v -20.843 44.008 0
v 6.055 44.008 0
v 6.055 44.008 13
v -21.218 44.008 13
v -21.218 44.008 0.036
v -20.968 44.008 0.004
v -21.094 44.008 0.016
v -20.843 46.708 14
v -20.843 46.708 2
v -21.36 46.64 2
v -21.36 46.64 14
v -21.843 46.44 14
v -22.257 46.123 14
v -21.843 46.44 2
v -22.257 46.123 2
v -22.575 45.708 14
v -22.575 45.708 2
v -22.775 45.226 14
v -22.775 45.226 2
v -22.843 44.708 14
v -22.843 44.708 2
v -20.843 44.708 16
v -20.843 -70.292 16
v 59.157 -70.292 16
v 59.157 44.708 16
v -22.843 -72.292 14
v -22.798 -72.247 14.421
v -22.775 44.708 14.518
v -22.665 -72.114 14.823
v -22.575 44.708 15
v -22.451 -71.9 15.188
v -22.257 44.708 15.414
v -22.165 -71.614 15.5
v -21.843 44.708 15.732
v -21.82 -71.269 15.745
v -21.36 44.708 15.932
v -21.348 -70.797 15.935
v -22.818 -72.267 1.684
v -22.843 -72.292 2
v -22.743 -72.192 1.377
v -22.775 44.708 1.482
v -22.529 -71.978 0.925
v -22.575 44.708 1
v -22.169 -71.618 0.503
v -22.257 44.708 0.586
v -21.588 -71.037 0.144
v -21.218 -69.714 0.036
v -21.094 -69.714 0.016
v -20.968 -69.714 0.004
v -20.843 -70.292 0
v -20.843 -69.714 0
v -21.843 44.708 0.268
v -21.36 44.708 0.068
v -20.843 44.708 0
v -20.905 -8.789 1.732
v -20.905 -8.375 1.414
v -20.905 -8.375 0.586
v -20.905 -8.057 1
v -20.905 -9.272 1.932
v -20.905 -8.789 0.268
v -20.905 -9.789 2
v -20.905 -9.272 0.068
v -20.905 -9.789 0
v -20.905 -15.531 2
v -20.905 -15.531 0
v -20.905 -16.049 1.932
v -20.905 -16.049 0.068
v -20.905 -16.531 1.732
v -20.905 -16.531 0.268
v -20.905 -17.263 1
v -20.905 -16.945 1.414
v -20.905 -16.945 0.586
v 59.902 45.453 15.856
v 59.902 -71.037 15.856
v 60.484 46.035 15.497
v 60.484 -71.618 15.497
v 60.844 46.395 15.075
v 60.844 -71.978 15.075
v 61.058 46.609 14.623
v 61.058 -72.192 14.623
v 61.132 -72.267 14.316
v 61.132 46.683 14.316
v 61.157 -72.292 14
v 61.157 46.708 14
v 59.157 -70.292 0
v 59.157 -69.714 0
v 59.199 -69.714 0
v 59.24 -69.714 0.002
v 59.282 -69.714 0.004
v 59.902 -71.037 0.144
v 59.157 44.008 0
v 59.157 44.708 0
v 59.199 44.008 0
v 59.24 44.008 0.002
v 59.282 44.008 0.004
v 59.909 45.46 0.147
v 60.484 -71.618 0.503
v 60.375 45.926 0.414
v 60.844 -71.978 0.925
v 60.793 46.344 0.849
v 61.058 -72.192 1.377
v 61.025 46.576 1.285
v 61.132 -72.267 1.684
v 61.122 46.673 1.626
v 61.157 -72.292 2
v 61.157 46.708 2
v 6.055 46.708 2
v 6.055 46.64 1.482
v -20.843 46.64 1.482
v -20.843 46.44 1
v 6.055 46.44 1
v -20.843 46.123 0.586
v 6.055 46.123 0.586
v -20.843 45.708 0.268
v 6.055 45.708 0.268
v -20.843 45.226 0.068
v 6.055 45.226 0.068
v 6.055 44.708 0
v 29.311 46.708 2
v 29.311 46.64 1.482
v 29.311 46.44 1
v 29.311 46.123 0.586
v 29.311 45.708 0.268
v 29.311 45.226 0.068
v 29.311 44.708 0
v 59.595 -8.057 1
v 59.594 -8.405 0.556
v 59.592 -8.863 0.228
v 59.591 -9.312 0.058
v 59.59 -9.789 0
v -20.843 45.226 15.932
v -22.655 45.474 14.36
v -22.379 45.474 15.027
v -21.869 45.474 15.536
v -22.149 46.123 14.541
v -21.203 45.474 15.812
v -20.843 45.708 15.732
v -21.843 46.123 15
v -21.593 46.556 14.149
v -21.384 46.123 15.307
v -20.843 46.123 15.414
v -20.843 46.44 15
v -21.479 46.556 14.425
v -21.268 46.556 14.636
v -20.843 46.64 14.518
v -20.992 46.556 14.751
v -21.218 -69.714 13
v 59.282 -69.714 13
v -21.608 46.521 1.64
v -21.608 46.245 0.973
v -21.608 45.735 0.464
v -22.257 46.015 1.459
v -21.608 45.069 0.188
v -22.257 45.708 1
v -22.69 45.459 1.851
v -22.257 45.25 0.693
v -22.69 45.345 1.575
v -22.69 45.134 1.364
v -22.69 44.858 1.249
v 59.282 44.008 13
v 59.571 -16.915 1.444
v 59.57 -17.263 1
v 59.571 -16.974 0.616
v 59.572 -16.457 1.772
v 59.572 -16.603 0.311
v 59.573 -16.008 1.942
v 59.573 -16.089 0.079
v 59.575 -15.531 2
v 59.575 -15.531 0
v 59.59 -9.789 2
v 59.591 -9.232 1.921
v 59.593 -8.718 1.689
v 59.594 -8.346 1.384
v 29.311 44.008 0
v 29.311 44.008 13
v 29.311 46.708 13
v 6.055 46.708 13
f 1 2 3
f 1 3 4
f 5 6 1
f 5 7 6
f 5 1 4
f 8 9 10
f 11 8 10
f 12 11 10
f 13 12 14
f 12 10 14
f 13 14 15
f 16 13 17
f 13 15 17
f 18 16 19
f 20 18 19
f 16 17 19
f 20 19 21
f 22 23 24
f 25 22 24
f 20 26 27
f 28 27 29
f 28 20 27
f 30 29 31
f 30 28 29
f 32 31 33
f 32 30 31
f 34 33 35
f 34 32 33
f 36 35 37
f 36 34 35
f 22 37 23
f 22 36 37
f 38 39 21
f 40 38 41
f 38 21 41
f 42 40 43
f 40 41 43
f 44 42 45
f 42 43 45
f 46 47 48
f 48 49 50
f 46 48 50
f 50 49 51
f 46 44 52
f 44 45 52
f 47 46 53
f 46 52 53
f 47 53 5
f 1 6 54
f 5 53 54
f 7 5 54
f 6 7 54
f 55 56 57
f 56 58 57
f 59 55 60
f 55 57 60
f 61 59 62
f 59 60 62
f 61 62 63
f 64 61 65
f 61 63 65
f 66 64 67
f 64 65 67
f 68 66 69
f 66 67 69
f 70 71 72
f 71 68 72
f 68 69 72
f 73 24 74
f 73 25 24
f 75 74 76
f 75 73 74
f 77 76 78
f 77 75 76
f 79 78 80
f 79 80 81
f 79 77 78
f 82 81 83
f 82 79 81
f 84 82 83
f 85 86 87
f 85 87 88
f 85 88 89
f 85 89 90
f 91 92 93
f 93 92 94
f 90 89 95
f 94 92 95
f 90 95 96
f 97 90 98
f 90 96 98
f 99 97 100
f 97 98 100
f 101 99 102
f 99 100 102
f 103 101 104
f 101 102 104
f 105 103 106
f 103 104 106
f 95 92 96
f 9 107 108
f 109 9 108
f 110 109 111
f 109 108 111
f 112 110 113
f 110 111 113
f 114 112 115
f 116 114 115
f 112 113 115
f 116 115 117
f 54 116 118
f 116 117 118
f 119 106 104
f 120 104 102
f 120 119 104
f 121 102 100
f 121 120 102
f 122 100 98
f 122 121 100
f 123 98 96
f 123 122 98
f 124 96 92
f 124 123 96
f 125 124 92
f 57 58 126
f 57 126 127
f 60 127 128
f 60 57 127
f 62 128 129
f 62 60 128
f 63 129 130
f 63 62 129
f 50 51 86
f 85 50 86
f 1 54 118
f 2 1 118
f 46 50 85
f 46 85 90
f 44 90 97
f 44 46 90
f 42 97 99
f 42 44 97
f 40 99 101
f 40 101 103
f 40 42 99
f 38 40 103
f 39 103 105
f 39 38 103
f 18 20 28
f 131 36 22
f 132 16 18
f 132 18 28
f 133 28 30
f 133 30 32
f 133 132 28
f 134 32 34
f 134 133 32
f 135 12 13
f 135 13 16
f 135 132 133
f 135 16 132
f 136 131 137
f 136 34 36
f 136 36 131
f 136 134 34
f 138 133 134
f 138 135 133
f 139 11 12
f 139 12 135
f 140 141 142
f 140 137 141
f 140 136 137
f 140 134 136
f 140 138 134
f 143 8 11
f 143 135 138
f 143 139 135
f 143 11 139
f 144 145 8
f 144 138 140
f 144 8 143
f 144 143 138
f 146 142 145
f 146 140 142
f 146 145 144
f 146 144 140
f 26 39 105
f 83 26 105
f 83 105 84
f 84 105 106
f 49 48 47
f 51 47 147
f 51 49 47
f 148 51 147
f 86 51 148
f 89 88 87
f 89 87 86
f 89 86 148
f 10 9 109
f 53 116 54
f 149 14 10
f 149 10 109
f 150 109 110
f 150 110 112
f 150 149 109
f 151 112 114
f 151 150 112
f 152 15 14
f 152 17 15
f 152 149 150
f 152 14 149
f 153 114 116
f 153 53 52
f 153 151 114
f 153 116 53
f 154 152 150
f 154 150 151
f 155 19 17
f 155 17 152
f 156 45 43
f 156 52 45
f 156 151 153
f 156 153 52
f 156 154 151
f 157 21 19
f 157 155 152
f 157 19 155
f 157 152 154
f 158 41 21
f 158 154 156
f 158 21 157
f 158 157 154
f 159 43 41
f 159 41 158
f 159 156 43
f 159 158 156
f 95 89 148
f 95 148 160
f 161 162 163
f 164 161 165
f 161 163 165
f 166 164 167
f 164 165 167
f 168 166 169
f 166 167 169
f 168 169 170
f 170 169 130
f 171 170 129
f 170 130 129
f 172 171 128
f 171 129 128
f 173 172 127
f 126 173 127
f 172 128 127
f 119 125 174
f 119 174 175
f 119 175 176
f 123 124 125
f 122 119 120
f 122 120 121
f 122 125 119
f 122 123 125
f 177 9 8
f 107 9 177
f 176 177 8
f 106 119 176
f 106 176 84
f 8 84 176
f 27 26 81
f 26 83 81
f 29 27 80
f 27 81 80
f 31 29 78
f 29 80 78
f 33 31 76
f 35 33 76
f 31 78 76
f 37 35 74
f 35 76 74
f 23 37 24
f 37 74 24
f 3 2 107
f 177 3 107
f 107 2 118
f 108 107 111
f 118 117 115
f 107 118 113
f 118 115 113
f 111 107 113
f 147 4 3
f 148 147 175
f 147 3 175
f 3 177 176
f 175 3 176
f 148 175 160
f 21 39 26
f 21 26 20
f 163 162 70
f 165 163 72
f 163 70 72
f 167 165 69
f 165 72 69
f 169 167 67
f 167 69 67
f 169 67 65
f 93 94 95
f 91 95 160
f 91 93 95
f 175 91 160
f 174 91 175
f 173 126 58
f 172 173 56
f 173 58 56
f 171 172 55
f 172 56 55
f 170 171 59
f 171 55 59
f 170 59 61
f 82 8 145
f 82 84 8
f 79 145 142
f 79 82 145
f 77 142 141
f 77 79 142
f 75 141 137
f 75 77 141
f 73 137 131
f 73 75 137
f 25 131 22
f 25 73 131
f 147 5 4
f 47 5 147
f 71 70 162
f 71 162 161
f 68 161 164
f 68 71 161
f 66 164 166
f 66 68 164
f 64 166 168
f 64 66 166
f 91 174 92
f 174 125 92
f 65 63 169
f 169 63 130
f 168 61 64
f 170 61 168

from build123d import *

# Parameters (mm, degrees)
F0_W         = 84
F0_H         = 119
F1_DEPTH     = 16
F2_W         = 23.2555542788
F2_H         = 5.3250671498
F3_DEPTH     = 13
F4_R         = 2
F5_T1_DEPTH  = 122
F5_T3_DEPTH  = 94
F5_T5_DEPTH  = 129
F5_T7_DEPTH  = 41.8466055248
F5_T9_DEPTH  = 12
F5_S13_W     = 2
F5_S13_H     = 2
F5_T14_DEPTH = 2
F5_T18_ANGLE = 90
F7_DEPTH     = 2
F8_T1_DEPTH  = 90.4739352316
F8_T3_DEPTH  = 90.5


# Not quite as in the source:
# - a fillet or chamfer that OpenCascade refuses, or shapes differently, is made with other operations: its cross-section is extruded or revolved along the edge and cut away or added


with BuildPart() as f1:
    # F0 (on Top) → F1 (new body)
    with BuildSketch(Plane.XY):
        with Locations((19.1573249176, -12.7916212418)):
            Rectangle(F0_W, F0_H)
    extrude(amount=F1_DEPTH)

    # F2 (on Top) → F3 (cut)
    with BuildSketch(Plane.XY):
        Polygon((6.055165114, 44.0079532564), (-21.2180707604, 44.0079532564), (-21.2180707604, -69.7137644664), (59.2819292396, -69.7137644664), (59.2819292396, 44.0079532564), (29.3107193928, 44.0079532564), align=None)
        with Locations((17.6829422534, 46.6704868313)):
            Rectangle(F2_W, F2_H)
    extrude(amount=F3_DEPTH, mode=Mode.SUBTRACT)

    # F4
    f4_edges = [f1.edges().sort_by_distance(p)[0] for p in [
        (61.157325, -12.791621, 16),
        (19.157325, -72.291621, 16),
        (-22.842675, -12.791621, 16),
        (19.157325, 46.708379, 16),
        (-8.393755, 46.708379, 0),
    ]]
    fillet(f4_edges, radius=F4_R)

    # F5: fillet of radius 2 on 4 edges, made by hand

    # F5_s2 → F5_t1 (cut)
    with BuildSketch(Plane.XZ.offset(-44.7083787582)):
        with BuildLine():
            ThreePointArc((-22.8426750824, 2), (-22.2568886448, 0.5857864376), (-20.8426750824, 0))
            Line((-20.8426750824, 0), (-22.8426750824, 0))
            Line((-22.8426750824, 0), (-22.8426750824, 2))
        make_face()
    extrude(amount=F5_T1_DEPTH, mode=Mode.SUBTRACT)

    # F5_s4 → F5_t3 (cut)
    with BuildSketch(Plane.YZ.offset(-27.8426750824)):
        with BuildLine():
            ThreePointArc((-70.2916212418, 0), (-71.7058348042, 0.5857864376), (-72.2916212418, 2))
            Line((-72.2916212418, 2), (-72.2916212418, 0))
            Line((-72.2916212418, 0), (-70.2916212418, 0))
        make_face()
    extrude(amount=F5_T3_DEPTH, mode=Mode.SUBTRACT)

    # F5_s6 → F5_t5 (cut)
    with BuildSketch(Plane.XZ.offset(-51.7083787582)):
        with BuildLine():
            ThreePointArc((59.1573249176, 0), (60.57153848, 0.5857864376), (61.1573249176, 2))
            Line((61.1573249176, 2), (61.1573249176, 0))
            Line((61.1573249176, 0), (59.1573249176, 0))
        make_face()
    extrude(amount=F5_T5_DEPTH, mode=Mode.SUBTRACT)

    # F5_s8 → F5_t7 (cut)
    with BuildSketch(Plane.YZ.offset(24.3107193928)):
        with BuildLine():
            ThreePointArc((46.7083787582, 2), (46.1225923205, 0.5857864376), (44.7083787582, 0))
            Line((44.7083787582, 0), (46.7083787582, 0))
            Line((46.7083787582, 0), (46.7083787582, 2))
        make_face()
    extrude(amount=F5_T7_DEPTH, mode=Mode.SUBTRACT)

    # F5_s10 → F5_t9 (cut)
    with BuildSketch(Plane.XY.offset(2)):
        with BuildLine():
            ThreePointArc((-20.8426750824, 46.7083787582), (-22.2568886448, 46.1225923205), (-22.8426750824, 44.7083787582))
            Line((-22.8426750824, 44.7083787582), (-22.8426750824, 46.7083787582))
            Line((-22.8426750824, 46.7083787582), (-20.8426750824, 46.7083787582))
        make_face()
    extrude(amount=F5_T9_DEPTH, mode=Mode.SUBTRACT)


with BuildPart() as f5_tool12:
    # F5_s13 → F5_t14 (new body)
    with BuildSketch(Plane.XZ.offset(-44.7083787582)):
        with Locations((-21.8426750824, 15)):
            Rectangle(F5_S13_W, F5_S13_H)
    extrude(amount=-F5_T14_DEPTH)

    # F5_s15 → F5_t16 (revolve, cut)
    with BuildSketch(Plane(origin=(-20.8426750824, 44.7083787582, 14), x_dir=(0.7071067812, 0, -0.7071067812), z_dir=(0.7071067812, 0, 0.7071067812))):
        with BuildLine():
            ThreePointArc((0, -2), (2, 0), (0, 2))
            Line((0, 2), (0, -2))
        make_face()
    revolve(axis=Axis((-20.8426750824, 44.7083787582, 14), (0, 1, 0)), mode=Mode.SUBTRACT)


with BuildPart() as f1_1:
    add(f1.part)

    # F5_t11: cut F5_tool12
    add(f5_tool12.part, mode=Mode.SUBTRACT)

    # F5_s17 → F5_t18 (revolve, cut)
    with BuildSketch(Plane.XY.offset(2)):
        with BuildLine():
            ThreePointArc((-20.8426750824, 46.7083787582), (-22.2568886448, 46.1225923205), (-22.8426750824, 44.7083787582))
            Line((-22.8426750824, 44.7083787582), (-22.8426750824, 46.7083787582))
            Line((-22.8426750824, 46.7083787582), (-20.8426750824, 46.7083787582))
        make_face()
    revolve(axis=Axis((-22.8426750824, 44.7083787582, 2), (-1, 0, 0)), revolution_arc=F5_T18_ANGLE, mode=Mode.SUBTRACT)


with BuildPart() as f7:
    # F6 (on Top) → F7 (new body)
    with BuildSketch(Plane.XY):
        Polygon((59.5953304619, -7.7894940041), (-20.9046695381, -7.7894940041), (-20.9046695381, -17.5308659673), (59.5692656934, -17.5308659673), align=None)
    extrude(amount=F7_DEPTH)

    # F8: fillet of radius 2 on 4 edges, made by hand

    # F8_s2 → F8_t1 (cut)
    with BuildSketch(Plane.YZ.offset(-25.9046695381)):
        with BuildLine():
            ThreePointArc((-17.5308659673, 2), (-16.9450795296, 0.5857864376), (-15.5308659673, 0))
            Line((-15.5308659673, 0), (-17.5308659673, 0))
            Line((-17.5308659673, 0), (-17.5308659673, 2))
        make_face()
        with BuildLine():
            ThreePointArc((-17.5308659673, 0), (-16.9450795296, 1.4142135624), (-15.5308659673, 2))
            Line((-15.5308659673, 2), (-17.5308659673, 2))
            Line((-17.5308659673, 2), (-17.5308659673, 0))
        make_face()
    extrude(amount=F8_T1_DEPTH, mode=Mode.SUBTRACT)

    # F8_s4 → F8_t3 (cut)
    with BuildSketch(Plane.YZ.offset(-25.9046695381)):
        with BuildLine():
            ThreePointArc((-7.7894940041, 2), (-8.3752804417, 0.5857864376), (-9.7894940041, 0))
            Line((-9.7894940041, 0), (-7.7894940041, 0))
            Line((-7.7894940041, 0), (-7.7894940041, 2))
        make_face()
        with BuildLine():
            ThreePointArc((-7.7894940041, 0), (-8.3752804417, 1.4142135624), (-9.7894940041, 2))
            Line((-9.7894940041, 2), (-7.7894940041, 2))
            Line((-7.7894940041, 2), (-7.7894940041, 0))
        make_face()
    extrude(amount=F8_T3_DEPTH, mode=Mode.SUBTRACT)


solid = Compound([f1_1.part, f7.part])
